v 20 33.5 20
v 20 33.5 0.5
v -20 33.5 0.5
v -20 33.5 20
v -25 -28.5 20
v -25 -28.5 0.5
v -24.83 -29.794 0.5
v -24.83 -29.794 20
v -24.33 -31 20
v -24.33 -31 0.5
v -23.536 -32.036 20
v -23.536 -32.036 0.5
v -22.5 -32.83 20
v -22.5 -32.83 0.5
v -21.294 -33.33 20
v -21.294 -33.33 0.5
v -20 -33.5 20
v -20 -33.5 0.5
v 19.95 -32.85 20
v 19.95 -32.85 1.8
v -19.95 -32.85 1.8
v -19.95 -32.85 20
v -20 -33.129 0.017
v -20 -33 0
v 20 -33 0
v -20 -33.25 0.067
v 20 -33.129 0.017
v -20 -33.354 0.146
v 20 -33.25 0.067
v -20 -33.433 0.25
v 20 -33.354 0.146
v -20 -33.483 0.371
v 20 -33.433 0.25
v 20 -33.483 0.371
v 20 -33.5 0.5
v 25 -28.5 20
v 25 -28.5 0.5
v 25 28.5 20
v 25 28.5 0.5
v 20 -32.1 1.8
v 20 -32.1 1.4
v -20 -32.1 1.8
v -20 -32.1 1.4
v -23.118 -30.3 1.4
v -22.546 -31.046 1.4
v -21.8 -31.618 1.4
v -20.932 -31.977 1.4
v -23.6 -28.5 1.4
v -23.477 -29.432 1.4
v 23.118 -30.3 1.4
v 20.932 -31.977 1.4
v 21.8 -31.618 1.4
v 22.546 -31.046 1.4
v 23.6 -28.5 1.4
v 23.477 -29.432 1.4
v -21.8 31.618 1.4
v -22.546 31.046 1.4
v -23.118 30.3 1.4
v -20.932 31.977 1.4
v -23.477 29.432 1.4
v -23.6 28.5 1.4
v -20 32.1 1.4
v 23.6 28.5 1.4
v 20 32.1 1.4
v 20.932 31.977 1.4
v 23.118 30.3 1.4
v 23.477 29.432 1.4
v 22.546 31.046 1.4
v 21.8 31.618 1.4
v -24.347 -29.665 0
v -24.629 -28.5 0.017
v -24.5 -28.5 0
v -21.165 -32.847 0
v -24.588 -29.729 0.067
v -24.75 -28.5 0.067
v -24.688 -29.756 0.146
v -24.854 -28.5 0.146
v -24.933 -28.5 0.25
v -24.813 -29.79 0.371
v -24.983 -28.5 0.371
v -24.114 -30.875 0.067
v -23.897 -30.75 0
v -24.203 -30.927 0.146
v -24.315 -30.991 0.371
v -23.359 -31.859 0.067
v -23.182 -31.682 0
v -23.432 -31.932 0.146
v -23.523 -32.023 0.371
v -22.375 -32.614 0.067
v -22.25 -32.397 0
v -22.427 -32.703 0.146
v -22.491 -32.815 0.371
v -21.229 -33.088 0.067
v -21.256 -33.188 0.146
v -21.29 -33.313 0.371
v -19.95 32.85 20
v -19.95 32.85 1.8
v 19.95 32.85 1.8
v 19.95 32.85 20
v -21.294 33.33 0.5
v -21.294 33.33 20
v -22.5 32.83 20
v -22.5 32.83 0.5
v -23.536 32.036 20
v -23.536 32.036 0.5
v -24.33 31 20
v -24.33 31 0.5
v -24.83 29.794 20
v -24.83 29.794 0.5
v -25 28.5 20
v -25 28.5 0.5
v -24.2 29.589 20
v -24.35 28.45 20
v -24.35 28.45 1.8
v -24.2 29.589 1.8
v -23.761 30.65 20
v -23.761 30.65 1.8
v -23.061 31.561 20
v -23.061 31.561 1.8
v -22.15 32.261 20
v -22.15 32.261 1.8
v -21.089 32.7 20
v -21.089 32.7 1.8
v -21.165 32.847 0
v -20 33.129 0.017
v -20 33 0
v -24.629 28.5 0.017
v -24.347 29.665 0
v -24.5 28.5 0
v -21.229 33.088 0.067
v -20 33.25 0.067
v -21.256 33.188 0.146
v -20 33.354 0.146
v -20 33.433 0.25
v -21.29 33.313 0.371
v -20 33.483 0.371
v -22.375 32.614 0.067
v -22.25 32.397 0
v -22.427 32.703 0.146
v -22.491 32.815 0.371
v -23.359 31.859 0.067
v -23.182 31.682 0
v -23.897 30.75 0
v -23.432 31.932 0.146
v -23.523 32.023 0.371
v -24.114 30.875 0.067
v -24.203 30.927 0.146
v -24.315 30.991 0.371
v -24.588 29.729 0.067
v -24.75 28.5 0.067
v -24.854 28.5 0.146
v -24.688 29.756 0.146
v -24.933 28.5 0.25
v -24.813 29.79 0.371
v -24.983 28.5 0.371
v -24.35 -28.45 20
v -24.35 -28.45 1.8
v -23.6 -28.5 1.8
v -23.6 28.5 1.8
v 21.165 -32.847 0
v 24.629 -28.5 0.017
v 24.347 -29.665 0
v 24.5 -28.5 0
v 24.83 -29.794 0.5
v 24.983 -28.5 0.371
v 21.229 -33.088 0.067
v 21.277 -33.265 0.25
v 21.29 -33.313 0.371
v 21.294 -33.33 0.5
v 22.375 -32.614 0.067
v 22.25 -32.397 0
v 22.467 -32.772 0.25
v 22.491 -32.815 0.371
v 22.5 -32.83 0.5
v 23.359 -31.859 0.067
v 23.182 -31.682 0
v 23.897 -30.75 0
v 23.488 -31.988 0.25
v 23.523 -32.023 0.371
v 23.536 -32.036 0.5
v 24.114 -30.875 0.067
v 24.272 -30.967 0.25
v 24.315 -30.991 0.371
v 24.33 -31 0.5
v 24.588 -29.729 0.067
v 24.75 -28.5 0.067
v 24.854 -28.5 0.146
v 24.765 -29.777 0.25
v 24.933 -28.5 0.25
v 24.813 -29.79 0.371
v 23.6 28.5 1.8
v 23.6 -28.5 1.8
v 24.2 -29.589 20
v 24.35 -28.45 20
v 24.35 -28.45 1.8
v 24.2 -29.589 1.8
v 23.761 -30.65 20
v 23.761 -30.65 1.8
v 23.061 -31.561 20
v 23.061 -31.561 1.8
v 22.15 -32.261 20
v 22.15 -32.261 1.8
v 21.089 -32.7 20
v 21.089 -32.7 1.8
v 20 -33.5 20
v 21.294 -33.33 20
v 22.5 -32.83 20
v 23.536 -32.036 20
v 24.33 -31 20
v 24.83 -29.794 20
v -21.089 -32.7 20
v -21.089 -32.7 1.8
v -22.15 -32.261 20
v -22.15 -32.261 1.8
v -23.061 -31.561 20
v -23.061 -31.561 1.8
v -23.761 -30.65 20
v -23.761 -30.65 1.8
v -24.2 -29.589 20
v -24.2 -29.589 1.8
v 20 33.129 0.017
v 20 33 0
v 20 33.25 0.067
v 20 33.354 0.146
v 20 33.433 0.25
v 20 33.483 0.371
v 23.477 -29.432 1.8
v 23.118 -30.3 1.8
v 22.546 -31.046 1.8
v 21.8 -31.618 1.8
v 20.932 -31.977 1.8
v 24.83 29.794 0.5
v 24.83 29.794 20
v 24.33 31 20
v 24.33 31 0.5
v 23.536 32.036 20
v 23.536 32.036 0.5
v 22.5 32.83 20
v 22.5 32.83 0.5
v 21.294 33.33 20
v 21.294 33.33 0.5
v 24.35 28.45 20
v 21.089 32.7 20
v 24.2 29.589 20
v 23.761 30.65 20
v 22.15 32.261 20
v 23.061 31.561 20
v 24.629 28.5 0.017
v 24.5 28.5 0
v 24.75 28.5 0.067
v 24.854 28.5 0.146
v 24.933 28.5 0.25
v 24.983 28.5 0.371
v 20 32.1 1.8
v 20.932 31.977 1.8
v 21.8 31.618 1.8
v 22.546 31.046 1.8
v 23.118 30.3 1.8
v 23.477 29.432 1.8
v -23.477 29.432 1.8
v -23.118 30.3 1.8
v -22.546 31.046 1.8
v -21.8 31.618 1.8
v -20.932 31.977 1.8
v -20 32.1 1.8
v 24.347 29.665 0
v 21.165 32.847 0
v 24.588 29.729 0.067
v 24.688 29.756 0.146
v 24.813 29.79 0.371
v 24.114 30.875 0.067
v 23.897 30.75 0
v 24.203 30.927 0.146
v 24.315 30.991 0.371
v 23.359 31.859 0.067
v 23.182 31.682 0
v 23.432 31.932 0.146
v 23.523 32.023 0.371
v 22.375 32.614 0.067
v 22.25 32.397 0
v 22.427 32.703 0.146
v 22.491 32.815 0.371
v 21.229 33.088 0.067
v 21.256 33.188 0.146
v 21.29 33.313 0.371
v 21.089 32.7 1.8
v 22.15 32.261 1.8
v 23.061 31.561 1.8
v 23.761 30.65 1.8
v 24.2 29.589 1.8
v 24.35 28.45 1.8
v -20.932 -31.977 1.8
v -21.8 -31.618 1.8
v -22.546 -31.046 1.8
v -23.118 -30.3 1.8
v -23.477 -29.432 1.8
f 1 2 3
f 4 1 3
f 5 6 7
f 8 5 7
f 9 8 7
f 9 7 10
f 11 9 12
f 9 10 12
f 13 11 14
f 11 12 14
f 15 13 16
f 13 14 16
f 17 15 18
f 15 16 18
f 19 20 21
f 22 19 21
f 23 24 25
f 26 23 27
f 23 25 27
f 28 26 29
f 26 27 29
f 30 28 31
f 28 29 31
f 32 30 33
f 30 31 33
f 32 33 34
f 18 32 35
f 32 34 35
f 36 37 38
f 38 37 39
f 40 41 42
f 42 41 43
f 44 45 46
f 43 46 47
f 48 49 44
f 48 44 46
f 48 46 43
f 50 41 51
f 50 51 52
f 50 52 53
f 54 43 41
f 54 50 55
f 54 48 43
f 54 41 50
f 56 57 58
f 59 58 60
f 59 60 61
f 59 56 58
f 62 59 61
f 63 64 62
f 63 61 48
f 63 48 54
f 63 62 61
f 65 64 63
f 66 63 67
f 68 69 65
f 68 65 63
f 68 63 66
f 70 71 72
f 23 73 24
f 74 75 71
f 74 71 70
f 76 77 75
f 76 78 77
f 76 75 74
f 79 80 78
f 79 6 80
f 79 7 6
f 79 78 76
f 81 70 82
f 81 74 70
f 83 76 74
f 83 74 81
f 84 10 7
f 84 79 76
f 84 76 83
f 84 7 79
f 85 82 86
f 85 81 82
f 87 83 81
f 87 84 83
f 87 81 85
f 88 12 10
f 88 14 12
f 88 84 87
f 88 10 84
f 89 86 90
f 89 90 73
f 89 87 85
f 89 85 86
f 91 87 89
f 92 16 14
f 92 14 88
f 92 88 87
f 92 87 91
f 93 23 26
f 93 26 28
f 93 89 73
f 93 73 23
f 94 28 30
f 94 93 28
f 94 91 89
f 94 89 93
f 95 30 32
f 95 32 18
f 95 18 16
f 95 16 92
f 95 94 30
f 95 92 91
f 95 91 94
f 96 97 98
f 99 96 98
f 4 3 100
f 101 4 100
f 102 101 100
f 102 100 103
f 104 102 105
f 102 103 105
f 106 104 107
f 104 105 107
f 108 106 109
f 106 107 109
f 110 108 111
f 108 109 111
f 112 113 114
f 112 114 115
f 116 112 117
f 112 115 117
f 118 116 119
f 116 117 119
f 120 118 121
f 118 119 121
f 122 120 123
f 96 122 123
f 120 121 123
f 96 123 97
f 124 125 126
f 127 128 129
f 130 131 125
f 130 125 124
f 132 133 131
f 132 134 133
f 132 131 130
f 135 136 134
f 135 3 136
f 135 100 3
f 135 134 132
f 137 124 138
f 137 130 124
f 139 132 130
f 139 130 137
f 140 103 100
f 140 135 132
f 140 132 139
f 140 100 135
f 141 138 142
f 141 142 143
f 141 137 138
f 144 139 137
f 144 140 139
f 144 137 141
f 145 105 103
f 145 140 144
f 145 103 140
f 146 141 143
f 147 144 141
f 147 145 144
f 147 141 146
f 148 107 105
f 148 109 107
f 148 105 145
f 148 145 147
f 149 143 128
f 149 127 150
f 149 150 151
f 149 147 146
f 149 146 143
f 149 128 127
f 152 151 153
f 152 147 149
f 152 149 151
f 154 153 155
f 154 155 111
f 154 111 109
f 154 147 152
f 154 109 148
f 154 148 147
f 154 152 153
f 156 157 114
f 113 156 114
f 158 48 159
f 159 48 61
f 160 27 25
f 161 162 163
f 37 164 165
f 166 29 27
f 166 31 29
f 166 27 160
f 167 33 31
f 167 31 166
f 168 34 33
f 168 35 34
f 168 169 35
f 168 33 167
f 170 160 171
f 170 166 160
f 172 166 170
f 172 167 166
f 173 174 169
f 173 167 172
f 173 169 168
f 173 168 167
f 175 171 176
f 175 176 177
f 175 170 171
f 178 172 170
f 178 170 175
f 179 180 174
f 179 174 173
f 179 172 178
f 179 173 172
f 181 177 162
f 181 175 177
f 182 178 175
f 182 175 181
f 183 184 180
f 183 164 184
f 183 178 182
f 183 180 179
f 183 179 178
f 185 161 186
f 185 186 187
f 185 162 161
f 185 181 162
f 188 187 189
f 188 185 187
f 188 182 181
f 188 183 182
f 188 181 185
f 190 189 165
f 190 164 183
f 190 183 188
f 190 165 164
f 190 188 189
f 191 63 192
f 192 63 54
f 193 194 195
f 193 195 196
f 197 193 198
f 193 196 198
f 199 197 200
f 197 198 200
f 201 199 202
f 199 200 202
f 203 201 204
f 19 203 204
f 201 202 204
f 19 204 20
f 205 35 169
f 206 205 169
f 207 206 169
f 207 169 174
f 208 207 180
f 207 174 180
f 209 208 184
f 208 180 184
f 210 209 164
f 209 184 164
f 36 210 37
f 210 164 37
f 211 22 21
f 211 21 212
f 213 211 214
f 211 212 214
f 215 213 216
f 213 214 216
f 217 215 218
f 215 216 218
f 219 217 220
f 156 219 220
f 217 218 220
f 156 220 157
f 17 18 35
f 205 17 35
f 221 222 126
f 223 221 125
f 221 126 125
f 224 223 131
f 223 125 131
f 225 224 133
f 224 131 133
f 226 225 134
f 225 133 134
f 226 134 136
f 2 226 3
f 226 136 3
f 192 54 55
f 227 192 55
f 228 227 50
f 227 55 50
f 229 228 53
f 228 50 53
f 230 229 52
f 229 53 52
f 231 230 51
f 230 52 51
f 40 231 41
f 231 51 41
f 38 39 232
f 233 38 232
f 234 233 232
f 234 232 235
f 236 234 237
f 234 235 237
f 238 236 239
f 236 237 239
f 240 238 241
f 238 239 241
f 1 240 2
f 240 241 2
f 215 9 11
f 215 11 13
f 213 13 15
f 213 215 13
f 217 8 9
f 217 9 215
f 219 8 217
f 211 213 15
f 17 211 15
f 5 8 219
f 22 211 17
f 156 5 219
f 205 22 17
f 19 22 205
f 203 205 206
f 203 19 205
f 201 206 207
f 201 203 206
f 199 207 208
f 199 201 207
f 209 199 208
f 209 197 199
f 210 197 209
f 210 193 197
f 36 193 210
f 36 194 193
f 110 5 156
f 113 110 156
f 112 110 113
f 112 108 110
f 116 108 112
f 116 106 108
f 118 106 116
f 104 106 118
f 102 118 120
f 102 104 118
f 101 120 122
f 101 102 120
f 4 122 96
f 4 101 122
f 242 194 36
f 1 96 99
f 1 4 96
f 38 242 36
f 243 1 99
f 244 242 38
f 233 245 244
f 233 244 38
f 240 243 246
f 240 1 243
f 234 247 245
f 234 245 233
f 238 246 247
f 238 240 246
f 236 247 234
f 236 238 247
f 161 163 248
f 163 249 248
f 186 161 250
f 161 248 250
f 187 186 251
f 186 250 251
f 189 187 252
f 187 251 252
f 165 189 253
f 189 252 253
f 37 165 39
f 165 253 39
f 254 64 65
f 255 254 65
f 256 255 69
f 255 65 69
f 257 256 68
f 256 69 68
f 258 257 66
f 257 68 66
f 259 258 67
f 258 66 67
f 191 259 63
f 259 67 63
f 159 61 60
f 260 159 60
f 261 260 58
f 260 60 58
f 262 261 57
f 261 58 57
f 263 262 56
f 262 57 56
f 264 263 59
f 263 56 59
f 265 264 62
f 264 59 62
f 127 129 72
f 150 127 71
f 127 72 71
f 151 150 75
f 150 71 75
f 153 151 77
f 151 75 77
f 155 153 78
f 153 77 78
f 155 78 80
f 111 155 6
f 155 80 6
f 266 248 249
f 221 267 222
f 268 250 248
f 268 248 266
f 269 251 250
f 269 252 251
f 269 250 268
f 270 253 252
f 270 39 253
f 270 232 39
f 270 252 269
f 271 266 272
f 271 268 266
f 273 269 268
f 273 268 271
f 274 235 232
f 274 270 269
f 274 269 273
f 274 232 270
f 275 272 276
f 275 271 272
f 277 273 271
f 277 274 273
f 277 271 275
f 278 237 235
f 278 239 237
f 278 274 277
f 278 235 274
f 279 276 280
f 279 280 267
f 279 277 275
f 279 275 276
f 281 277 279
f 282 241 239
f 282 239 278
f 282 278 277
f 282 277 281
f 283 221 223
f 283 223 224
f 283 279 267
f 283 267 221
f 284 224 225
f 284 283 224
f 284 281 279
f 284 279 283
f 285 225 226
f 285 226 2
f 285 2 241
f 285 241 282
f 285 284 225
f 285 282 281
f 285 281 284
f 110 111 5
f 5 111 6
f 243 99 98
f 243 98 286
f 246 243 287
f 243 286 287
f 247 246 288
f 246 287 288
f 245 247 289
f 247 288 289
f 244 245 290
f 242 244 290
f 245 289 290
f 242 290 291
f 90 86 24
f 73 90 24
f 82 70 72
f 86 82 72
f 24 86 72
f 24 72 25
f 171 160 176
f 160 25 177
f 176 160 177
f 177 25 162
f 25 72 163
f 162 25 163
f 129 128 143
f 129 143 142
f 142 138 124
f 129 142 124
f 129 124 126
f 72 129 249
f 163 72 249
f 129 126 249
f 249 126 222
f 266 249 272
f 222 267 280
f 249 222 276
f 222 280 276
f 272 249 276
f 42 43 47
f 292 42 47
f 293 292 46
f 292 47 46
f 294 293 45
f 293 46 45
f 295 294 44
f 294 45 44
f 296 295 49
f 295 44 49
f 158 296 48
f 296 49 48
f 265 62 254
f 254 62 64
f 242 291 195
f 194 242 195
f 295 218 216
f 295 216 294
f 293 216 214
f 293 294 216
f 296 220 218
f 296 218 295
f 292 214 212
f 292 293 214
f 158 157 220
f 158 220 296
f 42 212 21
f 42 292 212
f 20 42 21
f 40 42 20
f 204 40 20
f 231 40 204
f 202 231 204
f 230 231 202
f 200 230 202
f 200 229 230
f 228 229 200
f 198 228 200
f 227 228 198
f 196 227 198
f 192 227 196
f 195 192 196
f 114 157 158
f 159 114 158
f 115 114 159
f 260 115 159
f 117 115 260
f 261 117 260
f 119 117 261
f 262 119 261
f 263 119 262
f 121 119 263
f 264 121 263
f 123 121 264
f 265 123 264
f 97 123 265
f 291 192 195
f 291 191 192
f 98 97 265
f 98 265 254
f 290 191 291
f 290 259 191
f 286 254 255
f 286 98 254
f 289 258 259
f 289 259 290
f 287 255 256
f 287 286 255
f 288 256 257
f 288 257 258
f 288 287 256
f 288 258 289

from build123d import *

# Parameters (mm, degrees)
F4_DEPTH = 1.8
F5_DEPTH = 20
F6_DEPTH = 1.4
F7_R     = 0.5


with BuildPart() as f4:
    # F3 (on Top) → F4 (new body)
    with BuildSketch(Plane.XY):
        with BuildLine():
            ThreePointArc((24.35, 28.45), (23.0612698372, 31.5612698372), (19.95, 32.85))
            Line((19.95, 32.85), (-19.95, 32.85))
            ThreePointArc((-19.95, 32.85), (-23.0612698372, 31.5612698372), (-24.35, 28.45))
            Line((-24.35, 28.45), (-24.35, -28.45))
            ThreePointArc((-24.35, -28.45), (-23.0612698372, -31.5612698372), (-19.95, -32.85))
            Line((-19.95, -32.85), (19.95, -32.85))
            ThreePointArc((19.95, -32.85), (23.0612698372, -31.5612698372), (24.35, -28.45))
            Line((24.35, -28.45), (24.35, 28.45))
        make_face()
        with BuildLine():
            Line((20, -32.1), (-20, -32.1))
            ThreePointArc((-20, -32.1), (-22.5455844123, -31.0455844123), (-23.6, -28.5))
            Line((-23.6, -28.5), (-23.6, 28.5))
            ThreePointArc((-23.6, 28.5), (-22.5455844123, 31.0455844123), (-20, 32.1))
            Line((-20, 32.1), (20, 32.1))
            ThreePointArc((20, 32.1), (22.5455844123, 31.0455844123), (23.6, 28.5))
            Line((23.6, 28.5), (23.6, -28.5))
            ThreePointArc((23.6, -28.5), (22.5455844123, -31.0455844123), (20, -32.1))
        make_face(mode=Mode.SUBTRACT)
    extrude(amount=F4_DEPTH)

    # F3 (on Top) → F5 (join)
    with BuildSketch(Plane.XY):
        with BuildLine():
            ThreePointArc((-25, -28.5), (-23.5355339059, -32.0355339059), (-20, -33.5))
            Line((-20, -33.5), (20, -33.5))
            ThreePointArc((20, -33.5), (23.5355339059, -32.0355339059), (25, -28.5))
            Line((25, -28.5), (25, 28.5))
            ThreePointArc((25, 28.5), (23.5355339059, 32.0355339059), (20, 33.5))
            Line((20, 33.5), (-20, 33.5))
            ThreePointArc((-20, 33.5), (-23.5355339059, 32.0355339059), (-25, 28.5))
            Line((-25, 28.5), (-25, -28.5))
        make_face()
        with BuildLine():
            Line((-19.95, 32.85), (19.95, 32.85))
            ThreePointArc((19.95, 32.85), (23.0612698372, 31.5612698372), (24.35, 28.45))
            Line((24.35, 28.45), (24.35, -28.45))
            ThreePointArc((24.35, -28.45), (23.0612698372, -31.5612698372), (19.95, -32.85))
            Line((19.95, -32.85), (-19.95, -32.85))
            ThreePointArc((-19.95, -32.85), (-23.0612698372, -31.5612698372), (-24.35, -28.45))
            Line((-24.35, -28.45), (-24.35, 28.45))
            ThreePointArc((-24.35, 28.45), (-23.0612698372, 31.5612698372), (-19.95, 32.85))
        make_face(mode=Mode.SUBTRACT)
    extrude(amount=F5_DEPTH)

    # F3 (on Top) → F6 (join)
    with BuildSketch(Plane.XY):
        with BuildLine():
            ThreePointArc((-23.6, -28.5), (-22.5455844123, -31.0455844123), (-20, -32.1))
            Line((-20, -32.1), (20, -32.1))
            ThreePointArc((20, -32.1), (22.5455844123, -31.0455844123), (23.6, -28.5))
            Line((23.6, -28.5), (23.6, 28.5))
            ThreePointArc((23.6, 28.5), (22.5455844123, 31.0455844123), (20, 32.1))
            Line((20, 32.1), (-20, 32.1))
            ThreePointArc((-20, 32.1), (-22.5455844123, 31.0455844123), (-23.6, 28.5))
            Line((-23.6, 28.5), (-23.6, -28.5))
        make_face()
    extrude(amount=F6_DEPTH)

    # F7
    f7_edges = [f4.edges().sort_by_distance(p)[0] for p in [
        (25, 0, 0),
    ]]
    fillet(f7_edges, radius=F7_R)


solid = f4.part
